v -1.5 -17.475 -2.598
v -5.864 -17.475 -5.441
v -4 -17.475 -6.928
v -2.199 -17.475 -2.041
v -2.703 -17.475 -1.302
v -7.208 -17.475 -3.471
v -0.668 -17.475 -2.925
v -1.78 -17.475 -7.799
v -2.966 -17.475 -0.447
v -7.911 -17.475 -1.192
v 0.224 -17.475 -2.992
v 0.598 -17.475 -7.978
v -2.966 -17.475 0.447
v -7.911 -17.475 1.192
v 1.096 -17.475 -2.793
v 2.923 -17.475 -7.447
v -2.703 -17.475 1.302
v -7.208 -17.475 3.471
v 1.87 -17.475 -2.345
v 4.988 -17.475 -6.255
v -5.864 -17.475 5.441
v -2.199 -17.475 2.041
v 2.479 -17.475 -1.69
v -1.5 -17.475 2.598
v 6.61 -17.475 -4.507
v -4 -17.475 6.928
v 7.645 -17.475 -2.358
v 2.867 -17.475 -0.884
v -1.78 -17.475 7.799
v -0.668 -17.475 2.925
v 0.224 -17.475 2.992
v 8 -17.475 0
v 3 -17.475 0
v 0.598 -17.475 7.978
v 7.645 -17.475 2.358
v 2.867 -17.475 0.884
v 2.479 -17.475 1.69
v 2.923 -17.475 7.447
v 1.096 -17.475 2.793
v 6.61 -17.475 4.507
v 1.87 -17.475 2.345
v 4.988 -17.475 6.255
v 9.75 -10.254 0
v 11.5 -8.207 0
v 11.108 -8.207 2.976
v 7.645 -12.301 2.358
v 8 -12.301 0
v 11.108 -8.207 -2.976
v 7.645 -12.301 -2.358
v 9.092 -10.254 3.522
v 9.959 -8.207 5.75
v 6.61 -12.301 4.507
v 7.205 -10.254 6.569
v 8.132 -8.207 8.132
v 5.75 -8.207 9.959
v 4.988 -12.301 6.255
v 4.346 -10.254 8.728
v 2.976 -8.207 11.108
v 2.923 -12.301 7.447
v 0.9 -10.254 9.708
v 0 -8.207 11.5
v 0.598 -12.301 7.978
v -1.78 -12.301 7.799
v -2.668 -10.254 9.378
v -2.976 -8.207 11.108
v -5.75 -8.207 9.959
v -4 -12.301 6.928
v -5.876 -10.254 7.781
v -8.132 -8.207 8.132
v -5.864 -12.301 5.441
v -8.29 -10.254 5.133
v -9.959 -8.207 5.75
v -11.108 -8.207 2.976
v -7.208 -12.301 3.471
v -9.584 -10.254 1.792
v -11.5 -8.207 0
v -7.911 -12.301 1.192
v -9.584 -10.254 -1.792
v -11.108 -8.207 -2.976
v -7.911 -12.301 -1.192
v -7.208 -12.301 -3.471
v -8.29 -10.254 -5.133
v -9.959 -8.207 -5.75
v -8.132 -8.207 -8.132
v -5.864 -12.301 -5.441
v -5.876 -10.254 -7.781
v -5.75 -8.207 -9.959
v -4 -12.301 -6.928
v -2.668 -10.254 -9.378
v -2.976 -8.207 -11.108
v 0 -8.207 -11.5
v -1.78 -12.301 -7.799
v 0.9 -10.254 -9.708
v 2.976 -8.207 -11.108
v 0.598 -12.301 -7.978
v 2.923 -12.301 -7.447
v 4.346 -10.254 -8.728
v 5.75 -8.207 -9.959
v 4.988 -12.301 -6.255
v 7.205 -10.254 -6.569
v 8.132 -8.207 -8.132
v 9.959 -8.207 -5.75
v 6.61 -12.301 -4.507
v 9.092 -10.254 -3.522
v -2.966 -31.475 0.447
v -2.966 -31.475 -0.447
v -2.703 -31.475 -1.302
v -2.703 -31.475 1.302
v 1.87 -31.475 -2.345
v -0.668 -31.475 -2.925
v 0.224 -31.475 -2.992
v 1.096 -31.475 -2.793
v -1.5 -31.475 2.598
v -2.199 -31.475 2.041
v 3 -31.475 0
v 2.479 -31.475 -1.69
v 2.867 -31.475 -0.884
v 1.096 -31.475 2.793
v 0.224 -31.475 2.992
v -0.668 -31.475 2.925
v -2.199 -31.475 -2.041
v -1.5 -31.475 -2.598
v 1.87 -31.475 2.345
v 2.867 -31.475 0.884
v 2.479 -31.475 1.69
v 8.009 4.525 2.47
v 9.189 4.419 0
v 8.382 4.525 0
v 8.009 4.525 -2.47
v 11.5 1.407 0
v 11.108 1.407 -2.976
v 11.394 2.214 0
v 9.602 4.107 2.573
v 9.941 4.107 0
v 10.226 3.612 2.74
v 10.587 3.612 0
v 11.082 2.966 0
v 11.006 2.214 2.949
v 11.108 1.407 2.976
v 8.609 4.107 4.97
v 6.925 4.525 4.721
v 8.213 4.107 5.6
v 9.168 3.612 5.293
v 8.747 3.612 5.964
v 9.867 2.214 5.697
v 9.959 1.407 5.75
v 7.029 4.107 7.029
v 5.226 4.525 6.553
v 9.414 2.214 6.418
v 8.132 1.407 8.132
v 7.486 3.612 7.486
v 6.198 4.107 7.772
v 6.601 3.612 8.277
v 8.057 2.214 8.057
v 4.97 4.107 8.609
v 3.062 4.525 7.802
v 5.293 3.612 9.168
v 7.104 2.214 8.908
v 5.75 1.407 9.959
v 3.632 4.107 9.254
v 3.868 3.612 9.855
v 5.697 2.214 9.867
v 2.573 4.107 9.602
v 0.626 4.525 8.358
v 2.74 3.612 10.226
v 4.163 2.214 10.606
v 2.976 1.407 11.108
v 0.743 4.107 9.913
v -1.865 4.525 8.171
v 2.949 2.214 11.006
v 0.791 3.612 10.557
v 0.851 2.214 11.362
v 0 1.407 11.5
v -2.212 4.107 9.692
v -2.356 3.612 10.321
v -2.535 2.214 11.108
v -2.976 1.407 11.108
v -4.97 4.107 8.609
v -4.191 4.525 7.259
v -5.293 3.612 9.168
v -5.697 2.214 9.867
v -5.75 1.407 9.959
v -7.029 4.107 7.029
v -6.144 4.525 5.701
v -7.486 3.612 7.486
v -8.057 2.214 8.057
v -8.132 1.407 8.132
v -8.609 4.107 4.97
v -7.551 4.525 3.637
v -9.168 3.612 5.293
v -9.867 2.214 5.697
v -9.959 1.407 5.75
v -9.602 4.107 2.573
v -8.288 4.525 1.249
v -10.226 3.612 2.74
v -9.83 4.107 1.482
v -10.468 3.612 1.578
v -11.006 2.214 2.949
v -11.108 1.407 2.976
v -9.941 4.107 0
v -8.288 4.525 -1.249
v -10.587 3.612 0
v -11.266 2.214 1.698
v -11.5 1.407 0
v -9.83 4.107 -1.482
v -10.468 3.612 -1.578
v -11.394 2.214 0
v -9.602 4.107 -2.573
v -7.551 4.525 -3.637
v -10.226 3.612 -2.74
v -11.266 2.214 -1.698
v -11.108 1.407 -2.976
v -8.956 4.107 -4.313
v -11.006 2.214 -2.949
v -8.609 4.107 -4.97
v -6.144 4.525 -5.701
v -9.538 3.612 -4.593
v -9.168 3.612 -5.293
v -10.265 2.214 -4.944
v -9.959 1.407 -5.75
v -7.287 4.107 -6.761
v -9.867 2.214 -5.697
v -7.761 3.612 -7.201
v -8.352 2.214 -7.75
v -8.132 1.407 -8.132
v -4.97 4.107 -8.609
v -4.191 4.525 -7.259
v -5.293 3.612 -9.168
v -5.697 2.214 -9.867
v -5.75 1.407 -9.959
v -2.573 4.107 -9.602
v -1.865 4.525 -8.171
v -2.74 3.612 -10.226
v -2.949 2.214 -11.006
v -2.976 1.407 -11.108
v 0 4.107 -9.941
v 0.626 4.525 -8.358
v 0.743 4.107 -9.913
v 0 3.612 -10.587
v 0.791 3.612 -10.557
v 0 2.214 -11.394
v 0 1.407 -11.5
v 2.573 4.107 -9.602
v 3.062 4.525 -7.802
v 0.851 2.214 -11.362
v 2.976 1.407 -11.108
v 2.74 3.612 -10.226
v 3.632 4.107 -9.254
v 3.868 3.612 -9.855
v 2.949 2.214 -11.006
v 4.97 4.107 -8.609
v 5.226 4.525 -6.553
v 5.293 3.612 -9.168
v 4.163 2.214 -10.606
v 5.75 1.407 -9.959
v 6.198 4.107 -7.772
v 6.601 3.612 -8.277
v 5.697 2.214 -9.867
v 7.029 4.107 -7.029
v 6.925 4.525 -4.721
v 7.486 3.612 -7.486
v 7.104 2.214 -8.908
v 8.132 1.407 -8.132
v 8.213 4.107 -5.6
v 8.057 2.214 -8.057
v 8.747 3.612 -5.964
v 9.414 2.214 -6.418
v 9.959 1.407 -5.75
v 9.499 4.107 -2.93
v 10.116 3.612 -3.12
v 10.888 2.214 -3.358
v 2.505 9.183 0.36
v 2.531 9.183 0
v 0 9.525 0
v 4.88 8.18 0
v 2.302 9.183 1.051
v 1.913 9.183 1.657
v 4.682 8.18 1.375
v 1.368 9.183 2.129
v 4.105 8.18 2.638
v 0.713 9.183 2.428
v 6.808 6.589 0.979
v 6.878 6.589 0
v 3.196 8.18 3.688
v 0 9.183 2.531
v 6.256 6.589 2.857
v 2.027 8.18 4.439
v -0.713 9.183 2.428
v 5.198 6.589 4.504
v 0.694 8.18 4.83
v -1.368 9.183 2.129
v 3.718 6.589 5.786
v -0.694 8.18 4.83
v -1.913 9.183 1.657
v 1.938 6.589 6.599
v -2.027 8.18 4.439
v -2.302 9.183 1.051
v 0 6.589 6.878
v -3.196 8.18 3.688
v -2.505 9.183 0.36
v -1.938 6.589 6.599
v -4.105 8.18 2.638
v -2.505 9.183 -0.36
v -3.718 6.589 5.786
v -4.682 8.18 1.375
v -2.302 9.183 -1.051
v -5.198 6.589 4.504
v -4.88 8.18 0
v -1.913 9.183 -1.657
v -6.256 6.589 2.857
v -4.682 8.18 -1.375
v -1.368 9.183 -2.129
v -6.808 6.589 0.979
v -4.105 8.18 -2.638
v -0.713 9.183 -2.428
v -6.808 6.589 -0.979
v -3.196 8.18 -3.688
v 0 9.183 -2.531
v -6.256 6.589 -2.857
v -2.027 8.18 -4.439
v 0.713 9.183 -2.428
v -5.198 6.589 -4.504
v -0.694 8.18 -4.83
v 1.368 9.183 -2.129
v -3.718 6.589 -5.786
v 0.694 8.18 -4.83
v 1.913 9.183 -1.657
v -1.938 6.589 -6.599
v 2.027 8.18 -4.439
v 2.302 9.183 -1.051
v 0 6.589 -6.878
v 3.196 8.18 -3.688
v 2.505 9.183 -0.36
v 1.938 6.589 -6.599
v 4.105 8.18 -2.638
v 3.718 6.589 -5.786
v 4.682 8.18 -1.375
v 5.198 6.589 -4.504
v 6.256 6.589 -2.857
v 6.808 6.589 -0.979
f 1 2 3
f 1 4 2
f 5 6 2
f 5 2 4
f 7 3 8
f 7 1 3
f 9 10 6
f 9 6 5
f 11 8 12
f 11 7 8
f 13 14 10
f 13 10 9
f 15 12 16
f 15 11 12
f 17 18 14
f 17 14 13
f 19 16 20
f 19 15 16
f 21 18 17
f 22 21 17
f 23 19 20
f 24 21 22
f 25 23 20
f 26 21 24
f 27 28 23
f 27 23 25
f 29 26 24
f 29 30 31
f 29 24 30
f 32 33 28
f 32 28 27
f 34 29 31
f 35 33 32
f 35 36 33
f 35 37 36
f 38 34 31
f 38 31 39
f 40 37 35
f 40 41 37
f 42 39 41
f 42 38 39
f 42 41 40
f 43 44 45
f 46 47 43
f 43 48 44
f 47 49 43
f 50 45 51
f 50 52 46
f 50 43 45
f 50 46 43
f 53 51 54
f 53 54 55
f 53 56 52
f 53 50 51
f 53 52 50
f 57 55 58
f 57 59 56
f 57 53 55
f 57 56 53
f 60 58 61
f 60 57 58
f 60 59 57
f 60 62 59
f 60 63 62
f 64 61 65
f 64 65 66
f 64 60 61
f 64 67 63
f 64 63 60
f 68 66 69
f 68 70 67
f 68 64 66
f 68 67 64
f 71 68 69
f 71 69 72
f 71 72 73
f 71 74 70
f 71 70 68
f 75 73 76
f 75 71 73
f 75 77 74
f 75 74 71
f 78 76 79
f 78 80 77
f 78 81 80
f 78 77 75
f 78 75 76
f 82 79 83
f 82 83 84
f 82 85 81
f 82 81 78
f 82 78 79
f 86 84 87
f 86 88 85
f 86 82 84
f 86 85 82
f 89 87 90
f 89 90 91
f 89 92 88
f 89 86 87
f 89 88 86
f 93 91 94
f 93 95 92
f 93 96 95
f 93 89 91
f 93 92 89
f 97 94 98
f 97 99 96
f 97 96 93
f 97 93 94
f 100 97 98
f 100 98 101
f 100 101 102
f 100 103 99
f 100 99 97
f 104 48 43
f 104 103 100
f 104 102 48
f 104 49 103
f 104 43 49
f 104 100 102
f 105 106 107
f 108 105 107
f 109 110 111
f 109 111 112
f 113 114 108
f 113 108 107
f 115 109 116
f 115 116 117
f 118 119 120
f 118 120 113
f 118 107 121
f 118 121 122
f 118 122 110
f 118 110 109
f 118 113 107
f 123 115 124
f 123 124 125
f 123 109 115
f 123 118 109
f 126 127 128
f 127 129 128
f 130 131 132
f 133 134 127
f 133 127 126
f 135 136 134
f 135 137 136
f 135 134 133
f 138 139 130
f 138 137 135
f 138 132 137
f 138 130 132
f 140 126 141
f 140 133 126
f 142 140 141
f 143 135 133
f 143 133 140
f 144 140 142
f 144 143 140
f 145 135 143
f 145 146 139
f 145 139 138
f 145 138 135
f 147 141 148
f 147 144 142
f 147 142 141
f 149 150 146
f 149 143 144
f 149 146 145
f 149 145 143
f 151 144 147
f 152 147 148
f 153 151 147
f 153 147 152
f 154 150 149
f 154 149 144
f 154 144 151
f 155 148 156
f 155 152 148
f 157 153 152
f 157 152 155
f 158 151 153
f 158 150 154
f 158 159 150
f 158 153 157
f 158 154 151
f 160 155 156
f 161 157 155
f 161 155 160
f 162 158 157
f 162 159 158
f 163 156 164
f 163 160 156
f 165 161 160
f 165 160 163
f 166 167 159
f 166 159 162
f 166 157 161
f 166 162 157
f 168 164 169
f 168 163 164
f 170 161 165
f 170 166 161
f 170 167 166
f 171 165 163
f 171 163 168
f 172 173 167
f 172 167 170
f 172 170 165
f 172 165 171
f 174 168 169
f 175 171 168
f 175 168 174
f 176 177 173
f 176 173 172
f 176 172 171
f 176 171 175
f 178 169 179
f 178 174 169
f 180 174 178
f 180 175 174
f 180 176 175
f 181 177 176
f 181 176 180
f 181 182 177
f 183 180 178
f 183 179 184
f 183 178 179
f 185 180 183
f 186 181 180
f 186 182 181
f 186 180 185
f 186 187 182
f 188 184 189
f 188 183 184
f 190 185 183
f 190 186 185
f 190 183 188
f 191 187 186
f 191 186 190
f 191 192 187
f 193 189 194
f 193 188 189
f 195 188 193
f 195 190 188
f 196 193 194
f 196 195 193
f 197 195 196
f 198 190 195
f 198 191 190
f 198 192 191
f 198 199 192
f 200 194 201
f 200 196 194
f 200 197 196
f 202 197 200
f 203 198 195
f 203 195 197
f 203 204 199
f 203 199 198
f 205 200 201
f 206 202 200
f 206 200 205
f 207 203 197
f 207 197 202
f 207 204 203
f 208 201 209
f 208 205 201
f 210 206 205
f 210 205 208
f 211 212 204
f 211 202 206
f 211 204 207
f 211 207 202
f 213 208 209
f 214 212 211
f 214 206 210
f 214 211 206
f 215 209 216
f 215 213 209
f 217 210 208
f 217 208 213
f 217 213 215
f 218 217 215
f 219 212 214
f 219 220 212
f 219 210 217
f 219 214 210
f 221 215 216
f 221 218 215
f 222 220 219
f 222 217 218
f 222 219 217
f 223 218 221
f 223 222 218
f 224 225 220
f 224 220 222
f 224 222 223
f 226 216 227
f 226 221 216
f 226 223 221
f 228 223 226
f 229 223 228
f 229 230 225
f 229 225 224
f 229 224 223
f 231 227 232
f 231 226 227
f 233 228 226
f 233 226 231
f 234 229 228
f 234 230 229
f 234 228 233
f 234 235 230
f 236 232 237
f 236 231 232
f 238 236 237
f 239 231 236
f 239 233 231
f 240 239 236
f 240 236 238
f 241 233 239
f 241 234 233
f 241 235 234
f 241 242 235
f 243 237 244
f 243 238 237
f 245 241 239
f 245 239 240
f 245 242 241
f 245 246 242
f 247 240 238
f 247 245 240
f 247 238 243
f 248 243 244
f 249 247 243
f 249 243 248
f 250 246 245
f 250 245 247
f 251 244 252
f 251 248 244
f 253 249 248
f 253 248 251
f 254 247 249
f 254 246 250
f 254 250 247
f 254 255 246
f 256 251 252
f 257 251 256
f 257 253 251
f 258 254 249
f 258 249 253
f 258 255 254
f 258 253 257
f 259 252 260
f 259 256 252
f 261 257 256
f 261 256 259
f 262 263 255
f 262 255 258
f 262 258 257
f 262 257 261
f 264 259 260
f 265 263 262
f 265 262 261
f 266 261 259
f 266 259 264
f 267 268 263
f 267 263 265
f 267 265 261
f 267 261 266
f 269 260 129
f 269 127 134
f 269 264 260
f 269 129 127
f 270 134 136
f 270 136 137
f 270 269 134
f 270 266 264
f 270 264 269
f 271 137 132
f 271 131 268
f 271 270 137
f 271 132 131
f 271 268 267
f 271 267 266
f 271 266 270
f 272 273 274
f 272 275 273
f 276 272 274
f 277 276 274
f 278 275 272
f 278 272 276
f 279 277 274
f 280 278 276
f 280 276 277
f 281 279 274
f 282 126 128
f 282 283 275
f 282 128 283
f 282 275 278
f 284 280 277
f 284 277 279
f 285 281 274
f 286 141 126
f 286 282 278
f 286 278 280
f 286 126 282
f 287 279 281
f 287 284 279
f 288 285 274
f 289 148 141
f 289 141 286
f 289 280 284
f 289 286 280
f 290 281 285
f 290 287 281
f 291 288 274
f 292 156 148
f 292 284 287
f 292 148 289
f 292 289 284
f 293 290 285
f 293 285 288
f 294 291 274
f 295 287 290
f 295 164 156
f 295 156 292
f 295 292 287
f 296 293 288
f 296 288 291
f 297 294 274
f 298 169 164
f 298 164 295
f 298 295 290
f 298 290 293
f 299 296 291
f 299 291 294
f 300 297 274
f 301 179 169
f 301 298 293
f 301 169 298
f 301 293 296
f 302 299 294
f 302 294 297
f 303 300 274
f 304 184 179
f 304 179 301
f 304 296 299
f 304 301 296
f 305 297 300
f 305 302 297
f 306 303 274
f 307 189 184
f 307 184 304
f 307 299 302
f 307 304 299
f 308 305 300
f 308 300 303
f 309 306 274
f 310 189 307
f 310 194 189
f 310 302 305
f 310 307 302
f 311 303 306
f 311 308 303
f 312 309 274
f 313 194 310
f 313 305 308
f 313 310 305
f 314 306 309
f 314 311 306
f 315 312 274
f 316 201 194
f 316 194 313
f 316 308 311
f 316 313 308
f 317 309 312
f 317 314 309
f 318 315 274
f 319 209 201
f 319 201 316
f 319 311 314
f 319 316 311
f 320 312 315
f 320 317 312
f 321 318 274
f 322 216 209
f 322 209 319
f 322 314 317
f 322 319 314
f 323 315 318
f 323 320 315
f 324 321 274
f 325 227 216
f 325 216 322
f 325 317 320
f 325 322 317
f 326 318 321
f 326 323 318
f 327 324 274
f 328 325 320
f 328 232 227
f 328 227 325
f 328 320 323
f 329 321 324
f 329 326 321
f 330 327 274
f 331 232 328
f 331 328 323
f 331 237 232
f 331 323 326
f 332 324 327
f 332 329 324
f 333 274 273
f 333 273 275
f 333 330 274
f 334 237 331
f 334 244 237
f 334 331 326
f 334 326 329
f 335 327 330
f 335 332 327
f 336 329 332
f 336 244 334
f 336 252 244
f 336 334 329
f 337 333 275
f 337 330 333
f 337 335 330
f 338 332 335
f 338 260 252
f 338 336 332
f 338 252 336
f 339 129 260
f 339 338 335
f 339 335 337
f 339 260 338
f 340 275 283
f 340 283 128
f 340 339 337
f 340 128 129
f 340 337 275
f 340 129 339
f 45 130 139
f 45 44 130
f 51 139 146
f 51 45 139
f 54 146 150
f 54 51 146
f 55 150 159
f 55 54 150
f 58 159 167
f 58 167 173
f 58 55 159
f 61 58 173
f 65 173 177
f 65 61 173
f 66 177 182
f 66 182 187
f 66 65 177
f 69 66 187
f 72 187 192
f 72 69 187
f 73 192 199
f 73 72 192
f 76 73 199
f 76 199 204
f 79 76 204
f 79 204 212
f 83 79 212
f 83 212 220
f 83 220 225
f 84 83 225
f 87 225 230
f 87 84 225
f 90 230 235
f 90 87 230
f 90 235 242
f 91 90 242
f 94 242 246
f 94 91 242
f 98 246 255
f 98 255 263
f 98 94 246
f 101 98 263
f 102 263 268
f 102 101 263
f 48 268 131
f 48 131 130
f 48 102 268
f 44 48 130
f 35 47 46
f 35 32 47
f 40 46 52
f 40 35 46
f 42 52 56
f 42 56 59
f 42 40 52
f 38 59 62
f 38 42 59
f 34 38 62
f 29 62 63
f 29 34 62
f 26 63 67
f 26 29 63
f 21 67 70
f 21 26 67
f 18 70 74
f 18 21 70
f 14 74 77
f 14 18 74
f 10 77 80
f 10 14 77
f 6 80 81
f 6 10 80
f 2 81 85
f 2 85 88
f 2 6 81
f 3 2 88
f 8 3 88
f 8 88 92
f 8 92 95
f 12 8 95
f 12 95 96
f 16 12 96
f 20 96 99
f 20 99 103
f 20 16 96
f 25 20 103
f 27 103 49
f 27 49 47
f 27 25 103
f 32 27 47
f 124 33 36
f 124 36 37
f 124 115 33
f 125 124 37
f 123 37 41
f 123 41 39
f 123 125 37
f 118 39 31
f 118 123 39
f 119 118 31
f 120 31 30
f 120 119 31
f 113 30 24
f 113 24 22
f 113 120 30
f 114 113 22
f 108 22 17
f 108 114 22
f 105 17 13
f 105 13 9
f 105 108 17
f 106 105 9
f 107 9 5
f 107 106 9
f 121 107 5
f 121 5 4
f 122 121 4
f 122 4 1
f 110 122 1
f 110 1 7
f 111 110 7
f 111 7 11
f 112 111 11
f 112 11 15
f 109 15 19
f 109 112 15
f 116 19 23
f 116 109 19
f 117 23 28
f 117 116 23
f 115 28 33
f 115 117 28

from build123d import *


with BuildPart() as part:
    # Esquisse1 → Révolution1 (revolve)
    with BuildSketch(Plane.XY):
        with BuildLine():
            Line((11.5, 1.406527307), (11.5, -8.206711775))
            Line((11.5, -8.206711775), (8, -12.301381653))
            Line((8, -12.301381653), (8, -17.475))
            Line((8, -17.475), (3, -17.475))
            Line((3, -17.475), (3, -31.475))
            Line((3, -31.475), (0, -31.475))
            Line((0, -31.475), (0, 9.525))
            ThreePointArc((0, 9.525), (4.879805324, 8.180044315), (8.381527307, 4.525))
            ThreePointArc((8.381527307, 4.525), (10.586620495, 3.611620495), (11.5, 1.406527307))
        make_face()
    revolve(axis=Axis((0, 9.525, 0), (0, -1, 0)))


solid = part.part
